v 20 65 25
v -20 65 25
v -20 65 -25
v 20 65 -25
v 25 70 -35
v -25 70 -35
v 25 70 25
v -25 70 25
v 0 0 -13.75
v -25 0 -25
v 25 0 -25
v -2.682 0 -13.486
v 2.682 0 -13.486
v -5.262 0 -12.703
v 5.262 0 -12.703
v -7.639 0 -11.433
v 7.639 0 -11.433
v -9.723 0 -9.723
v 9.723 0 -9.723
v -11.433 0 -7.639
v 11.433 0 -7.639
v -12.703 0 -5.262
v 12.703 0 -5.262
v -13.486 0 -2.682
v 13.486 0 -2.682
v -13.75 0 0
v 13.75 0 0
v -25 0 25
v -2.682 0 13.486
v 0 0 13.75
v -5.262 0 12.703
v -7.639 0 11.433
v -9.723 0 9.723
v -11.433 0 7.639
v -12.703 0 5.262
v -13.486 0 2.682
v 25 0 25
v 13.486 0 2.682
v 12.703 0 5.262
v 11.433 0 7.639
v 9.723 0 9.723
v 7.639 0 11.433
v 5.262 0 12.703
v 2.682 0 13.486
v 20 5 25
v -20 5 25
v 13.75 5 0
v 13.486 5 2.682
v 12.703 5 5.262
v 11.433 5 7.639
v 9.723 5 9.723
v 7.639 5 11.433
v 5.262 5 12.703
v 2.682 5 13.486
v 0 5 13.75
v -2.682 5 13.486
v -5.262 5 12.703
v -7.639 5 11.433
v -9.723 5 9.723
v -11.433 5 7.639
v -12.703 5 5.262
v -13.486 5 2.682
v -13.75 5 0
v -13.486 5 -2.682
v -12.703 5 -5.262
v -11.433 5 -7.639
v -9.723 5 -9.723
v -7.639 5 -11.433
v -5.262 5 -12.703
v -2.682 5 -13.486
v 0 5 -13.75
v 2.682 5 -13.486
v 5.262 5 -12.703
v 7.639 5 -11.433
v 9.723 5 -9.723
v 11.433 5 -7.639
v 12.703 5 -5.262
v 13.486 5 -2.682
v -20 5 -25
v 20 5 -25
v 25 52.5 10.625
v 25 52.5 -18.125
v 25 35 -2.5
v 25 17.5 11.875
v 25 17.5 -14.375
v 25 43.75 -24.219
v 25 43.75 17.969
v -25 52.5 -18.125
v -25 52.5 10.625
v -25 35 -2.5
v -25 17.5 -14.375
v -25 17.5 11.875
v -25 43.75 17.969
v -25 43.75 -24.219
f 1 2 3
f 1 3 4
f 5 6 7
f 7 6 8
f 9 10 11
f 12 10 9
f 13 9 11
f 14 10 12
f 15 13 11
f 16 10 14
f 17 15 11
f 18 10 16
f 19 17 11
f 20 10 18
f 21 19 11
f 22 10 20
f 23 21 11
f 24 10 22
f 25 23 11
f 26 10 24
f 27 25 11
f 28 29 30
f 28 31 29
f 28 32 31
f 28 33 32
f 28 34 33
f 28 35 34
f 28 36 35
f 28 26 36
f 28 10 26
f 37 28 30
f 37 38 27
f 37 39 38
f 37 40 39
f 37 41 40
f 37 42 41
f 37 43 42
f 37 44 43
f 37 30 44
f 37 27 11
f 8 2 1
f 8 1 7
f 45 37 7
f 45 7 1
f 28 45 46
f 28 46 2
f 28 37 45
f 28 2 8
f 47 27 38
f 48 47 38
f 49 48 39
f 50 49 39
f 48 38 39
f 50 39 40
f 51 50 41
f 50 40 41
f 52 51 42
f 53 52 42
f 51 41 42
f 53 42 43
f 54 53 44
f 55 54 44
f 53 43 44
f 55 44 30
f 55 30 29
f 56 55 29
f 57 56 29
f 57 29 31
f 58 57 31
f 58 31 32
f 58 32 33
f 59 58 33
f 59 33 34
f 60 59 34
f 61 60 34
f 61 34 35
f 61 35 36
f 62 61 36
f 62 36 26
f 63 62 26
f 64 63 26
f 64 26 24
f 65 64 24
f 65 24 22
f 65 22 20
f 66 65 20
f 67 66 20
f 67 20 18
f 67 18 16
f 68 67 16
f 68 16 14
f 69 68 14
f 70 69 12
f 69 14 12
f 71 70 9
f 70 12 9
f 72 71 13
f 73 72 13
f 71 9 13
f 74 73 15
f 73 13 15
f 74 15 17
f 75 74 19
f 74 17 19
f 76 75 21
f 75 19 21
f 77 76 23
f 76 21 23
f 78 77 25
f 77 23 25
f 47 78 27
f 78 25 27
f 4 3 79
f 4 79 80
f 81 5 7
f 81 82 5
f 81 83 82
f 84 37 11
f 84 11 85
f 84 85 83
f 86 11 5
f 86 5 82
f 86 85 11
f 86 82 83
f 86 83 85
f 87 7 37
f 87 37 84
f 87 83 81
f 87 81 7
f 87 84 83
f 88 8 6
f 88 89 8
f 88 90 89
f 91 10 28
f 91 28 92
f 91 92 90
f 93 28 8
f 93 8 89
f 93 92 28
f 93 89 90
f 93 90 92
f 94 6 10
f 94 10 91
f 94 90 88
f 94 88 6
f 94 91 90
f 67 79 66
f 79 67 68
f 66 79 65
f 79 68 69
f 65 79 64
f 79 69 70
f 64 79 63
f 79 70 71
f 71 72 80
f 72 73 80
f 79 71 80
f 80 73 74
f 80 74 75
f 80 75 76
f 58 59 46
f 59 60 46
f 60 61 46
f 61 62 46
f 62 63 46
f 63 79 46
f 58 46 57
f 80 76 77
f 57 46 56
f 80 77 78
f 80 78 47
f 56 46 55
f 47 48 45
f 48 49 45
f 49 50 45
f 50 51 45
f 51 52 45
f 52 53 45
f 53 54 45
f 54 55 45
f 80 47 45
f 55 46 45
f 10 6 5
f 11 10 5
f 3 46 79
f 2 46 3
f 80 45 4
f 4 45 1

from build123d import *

# Parameters (mm, degrees)
F2_W     = 50
F2_H     = 60
F0_W     = 50
F0_H     = 50
F4_W     = 40
F4_H     = 60
F5_DEPTH = 50
F6_R     = 13.75
F7_DEPTH = 25.4


with BuildPart() as f3:
    # F2 (on offset) → F3 section 0
    with BuildSketch(Plane.XZ.offset(-70)):
        with Locations((0, -5)):
            Rectangle(F2_W, F2_H)
    # F0 (on Front) → F3 section 1
    with BuildSketch(Plane.XZ):
        Rectangle(F0_W, F0_H)
    loft()

    # F4 (on face) → F5 (cut)
    with BuildSketch(Plane.XY.offset(25)):
        with Locations((0, 35)):
            Rectangle(F4_W, F4_H)
    extrude(amount=-F5_DEPTH, mode=Mode.SUBTRACT)

    # F6 (on face) → F7 (cut)
    with BuildSketch(Plane.XZ):
        Circle(F6_R)
    extrude(amount=-F7_DEPTH, mode=Mode.SUBTRACT)


solid = f3.part
